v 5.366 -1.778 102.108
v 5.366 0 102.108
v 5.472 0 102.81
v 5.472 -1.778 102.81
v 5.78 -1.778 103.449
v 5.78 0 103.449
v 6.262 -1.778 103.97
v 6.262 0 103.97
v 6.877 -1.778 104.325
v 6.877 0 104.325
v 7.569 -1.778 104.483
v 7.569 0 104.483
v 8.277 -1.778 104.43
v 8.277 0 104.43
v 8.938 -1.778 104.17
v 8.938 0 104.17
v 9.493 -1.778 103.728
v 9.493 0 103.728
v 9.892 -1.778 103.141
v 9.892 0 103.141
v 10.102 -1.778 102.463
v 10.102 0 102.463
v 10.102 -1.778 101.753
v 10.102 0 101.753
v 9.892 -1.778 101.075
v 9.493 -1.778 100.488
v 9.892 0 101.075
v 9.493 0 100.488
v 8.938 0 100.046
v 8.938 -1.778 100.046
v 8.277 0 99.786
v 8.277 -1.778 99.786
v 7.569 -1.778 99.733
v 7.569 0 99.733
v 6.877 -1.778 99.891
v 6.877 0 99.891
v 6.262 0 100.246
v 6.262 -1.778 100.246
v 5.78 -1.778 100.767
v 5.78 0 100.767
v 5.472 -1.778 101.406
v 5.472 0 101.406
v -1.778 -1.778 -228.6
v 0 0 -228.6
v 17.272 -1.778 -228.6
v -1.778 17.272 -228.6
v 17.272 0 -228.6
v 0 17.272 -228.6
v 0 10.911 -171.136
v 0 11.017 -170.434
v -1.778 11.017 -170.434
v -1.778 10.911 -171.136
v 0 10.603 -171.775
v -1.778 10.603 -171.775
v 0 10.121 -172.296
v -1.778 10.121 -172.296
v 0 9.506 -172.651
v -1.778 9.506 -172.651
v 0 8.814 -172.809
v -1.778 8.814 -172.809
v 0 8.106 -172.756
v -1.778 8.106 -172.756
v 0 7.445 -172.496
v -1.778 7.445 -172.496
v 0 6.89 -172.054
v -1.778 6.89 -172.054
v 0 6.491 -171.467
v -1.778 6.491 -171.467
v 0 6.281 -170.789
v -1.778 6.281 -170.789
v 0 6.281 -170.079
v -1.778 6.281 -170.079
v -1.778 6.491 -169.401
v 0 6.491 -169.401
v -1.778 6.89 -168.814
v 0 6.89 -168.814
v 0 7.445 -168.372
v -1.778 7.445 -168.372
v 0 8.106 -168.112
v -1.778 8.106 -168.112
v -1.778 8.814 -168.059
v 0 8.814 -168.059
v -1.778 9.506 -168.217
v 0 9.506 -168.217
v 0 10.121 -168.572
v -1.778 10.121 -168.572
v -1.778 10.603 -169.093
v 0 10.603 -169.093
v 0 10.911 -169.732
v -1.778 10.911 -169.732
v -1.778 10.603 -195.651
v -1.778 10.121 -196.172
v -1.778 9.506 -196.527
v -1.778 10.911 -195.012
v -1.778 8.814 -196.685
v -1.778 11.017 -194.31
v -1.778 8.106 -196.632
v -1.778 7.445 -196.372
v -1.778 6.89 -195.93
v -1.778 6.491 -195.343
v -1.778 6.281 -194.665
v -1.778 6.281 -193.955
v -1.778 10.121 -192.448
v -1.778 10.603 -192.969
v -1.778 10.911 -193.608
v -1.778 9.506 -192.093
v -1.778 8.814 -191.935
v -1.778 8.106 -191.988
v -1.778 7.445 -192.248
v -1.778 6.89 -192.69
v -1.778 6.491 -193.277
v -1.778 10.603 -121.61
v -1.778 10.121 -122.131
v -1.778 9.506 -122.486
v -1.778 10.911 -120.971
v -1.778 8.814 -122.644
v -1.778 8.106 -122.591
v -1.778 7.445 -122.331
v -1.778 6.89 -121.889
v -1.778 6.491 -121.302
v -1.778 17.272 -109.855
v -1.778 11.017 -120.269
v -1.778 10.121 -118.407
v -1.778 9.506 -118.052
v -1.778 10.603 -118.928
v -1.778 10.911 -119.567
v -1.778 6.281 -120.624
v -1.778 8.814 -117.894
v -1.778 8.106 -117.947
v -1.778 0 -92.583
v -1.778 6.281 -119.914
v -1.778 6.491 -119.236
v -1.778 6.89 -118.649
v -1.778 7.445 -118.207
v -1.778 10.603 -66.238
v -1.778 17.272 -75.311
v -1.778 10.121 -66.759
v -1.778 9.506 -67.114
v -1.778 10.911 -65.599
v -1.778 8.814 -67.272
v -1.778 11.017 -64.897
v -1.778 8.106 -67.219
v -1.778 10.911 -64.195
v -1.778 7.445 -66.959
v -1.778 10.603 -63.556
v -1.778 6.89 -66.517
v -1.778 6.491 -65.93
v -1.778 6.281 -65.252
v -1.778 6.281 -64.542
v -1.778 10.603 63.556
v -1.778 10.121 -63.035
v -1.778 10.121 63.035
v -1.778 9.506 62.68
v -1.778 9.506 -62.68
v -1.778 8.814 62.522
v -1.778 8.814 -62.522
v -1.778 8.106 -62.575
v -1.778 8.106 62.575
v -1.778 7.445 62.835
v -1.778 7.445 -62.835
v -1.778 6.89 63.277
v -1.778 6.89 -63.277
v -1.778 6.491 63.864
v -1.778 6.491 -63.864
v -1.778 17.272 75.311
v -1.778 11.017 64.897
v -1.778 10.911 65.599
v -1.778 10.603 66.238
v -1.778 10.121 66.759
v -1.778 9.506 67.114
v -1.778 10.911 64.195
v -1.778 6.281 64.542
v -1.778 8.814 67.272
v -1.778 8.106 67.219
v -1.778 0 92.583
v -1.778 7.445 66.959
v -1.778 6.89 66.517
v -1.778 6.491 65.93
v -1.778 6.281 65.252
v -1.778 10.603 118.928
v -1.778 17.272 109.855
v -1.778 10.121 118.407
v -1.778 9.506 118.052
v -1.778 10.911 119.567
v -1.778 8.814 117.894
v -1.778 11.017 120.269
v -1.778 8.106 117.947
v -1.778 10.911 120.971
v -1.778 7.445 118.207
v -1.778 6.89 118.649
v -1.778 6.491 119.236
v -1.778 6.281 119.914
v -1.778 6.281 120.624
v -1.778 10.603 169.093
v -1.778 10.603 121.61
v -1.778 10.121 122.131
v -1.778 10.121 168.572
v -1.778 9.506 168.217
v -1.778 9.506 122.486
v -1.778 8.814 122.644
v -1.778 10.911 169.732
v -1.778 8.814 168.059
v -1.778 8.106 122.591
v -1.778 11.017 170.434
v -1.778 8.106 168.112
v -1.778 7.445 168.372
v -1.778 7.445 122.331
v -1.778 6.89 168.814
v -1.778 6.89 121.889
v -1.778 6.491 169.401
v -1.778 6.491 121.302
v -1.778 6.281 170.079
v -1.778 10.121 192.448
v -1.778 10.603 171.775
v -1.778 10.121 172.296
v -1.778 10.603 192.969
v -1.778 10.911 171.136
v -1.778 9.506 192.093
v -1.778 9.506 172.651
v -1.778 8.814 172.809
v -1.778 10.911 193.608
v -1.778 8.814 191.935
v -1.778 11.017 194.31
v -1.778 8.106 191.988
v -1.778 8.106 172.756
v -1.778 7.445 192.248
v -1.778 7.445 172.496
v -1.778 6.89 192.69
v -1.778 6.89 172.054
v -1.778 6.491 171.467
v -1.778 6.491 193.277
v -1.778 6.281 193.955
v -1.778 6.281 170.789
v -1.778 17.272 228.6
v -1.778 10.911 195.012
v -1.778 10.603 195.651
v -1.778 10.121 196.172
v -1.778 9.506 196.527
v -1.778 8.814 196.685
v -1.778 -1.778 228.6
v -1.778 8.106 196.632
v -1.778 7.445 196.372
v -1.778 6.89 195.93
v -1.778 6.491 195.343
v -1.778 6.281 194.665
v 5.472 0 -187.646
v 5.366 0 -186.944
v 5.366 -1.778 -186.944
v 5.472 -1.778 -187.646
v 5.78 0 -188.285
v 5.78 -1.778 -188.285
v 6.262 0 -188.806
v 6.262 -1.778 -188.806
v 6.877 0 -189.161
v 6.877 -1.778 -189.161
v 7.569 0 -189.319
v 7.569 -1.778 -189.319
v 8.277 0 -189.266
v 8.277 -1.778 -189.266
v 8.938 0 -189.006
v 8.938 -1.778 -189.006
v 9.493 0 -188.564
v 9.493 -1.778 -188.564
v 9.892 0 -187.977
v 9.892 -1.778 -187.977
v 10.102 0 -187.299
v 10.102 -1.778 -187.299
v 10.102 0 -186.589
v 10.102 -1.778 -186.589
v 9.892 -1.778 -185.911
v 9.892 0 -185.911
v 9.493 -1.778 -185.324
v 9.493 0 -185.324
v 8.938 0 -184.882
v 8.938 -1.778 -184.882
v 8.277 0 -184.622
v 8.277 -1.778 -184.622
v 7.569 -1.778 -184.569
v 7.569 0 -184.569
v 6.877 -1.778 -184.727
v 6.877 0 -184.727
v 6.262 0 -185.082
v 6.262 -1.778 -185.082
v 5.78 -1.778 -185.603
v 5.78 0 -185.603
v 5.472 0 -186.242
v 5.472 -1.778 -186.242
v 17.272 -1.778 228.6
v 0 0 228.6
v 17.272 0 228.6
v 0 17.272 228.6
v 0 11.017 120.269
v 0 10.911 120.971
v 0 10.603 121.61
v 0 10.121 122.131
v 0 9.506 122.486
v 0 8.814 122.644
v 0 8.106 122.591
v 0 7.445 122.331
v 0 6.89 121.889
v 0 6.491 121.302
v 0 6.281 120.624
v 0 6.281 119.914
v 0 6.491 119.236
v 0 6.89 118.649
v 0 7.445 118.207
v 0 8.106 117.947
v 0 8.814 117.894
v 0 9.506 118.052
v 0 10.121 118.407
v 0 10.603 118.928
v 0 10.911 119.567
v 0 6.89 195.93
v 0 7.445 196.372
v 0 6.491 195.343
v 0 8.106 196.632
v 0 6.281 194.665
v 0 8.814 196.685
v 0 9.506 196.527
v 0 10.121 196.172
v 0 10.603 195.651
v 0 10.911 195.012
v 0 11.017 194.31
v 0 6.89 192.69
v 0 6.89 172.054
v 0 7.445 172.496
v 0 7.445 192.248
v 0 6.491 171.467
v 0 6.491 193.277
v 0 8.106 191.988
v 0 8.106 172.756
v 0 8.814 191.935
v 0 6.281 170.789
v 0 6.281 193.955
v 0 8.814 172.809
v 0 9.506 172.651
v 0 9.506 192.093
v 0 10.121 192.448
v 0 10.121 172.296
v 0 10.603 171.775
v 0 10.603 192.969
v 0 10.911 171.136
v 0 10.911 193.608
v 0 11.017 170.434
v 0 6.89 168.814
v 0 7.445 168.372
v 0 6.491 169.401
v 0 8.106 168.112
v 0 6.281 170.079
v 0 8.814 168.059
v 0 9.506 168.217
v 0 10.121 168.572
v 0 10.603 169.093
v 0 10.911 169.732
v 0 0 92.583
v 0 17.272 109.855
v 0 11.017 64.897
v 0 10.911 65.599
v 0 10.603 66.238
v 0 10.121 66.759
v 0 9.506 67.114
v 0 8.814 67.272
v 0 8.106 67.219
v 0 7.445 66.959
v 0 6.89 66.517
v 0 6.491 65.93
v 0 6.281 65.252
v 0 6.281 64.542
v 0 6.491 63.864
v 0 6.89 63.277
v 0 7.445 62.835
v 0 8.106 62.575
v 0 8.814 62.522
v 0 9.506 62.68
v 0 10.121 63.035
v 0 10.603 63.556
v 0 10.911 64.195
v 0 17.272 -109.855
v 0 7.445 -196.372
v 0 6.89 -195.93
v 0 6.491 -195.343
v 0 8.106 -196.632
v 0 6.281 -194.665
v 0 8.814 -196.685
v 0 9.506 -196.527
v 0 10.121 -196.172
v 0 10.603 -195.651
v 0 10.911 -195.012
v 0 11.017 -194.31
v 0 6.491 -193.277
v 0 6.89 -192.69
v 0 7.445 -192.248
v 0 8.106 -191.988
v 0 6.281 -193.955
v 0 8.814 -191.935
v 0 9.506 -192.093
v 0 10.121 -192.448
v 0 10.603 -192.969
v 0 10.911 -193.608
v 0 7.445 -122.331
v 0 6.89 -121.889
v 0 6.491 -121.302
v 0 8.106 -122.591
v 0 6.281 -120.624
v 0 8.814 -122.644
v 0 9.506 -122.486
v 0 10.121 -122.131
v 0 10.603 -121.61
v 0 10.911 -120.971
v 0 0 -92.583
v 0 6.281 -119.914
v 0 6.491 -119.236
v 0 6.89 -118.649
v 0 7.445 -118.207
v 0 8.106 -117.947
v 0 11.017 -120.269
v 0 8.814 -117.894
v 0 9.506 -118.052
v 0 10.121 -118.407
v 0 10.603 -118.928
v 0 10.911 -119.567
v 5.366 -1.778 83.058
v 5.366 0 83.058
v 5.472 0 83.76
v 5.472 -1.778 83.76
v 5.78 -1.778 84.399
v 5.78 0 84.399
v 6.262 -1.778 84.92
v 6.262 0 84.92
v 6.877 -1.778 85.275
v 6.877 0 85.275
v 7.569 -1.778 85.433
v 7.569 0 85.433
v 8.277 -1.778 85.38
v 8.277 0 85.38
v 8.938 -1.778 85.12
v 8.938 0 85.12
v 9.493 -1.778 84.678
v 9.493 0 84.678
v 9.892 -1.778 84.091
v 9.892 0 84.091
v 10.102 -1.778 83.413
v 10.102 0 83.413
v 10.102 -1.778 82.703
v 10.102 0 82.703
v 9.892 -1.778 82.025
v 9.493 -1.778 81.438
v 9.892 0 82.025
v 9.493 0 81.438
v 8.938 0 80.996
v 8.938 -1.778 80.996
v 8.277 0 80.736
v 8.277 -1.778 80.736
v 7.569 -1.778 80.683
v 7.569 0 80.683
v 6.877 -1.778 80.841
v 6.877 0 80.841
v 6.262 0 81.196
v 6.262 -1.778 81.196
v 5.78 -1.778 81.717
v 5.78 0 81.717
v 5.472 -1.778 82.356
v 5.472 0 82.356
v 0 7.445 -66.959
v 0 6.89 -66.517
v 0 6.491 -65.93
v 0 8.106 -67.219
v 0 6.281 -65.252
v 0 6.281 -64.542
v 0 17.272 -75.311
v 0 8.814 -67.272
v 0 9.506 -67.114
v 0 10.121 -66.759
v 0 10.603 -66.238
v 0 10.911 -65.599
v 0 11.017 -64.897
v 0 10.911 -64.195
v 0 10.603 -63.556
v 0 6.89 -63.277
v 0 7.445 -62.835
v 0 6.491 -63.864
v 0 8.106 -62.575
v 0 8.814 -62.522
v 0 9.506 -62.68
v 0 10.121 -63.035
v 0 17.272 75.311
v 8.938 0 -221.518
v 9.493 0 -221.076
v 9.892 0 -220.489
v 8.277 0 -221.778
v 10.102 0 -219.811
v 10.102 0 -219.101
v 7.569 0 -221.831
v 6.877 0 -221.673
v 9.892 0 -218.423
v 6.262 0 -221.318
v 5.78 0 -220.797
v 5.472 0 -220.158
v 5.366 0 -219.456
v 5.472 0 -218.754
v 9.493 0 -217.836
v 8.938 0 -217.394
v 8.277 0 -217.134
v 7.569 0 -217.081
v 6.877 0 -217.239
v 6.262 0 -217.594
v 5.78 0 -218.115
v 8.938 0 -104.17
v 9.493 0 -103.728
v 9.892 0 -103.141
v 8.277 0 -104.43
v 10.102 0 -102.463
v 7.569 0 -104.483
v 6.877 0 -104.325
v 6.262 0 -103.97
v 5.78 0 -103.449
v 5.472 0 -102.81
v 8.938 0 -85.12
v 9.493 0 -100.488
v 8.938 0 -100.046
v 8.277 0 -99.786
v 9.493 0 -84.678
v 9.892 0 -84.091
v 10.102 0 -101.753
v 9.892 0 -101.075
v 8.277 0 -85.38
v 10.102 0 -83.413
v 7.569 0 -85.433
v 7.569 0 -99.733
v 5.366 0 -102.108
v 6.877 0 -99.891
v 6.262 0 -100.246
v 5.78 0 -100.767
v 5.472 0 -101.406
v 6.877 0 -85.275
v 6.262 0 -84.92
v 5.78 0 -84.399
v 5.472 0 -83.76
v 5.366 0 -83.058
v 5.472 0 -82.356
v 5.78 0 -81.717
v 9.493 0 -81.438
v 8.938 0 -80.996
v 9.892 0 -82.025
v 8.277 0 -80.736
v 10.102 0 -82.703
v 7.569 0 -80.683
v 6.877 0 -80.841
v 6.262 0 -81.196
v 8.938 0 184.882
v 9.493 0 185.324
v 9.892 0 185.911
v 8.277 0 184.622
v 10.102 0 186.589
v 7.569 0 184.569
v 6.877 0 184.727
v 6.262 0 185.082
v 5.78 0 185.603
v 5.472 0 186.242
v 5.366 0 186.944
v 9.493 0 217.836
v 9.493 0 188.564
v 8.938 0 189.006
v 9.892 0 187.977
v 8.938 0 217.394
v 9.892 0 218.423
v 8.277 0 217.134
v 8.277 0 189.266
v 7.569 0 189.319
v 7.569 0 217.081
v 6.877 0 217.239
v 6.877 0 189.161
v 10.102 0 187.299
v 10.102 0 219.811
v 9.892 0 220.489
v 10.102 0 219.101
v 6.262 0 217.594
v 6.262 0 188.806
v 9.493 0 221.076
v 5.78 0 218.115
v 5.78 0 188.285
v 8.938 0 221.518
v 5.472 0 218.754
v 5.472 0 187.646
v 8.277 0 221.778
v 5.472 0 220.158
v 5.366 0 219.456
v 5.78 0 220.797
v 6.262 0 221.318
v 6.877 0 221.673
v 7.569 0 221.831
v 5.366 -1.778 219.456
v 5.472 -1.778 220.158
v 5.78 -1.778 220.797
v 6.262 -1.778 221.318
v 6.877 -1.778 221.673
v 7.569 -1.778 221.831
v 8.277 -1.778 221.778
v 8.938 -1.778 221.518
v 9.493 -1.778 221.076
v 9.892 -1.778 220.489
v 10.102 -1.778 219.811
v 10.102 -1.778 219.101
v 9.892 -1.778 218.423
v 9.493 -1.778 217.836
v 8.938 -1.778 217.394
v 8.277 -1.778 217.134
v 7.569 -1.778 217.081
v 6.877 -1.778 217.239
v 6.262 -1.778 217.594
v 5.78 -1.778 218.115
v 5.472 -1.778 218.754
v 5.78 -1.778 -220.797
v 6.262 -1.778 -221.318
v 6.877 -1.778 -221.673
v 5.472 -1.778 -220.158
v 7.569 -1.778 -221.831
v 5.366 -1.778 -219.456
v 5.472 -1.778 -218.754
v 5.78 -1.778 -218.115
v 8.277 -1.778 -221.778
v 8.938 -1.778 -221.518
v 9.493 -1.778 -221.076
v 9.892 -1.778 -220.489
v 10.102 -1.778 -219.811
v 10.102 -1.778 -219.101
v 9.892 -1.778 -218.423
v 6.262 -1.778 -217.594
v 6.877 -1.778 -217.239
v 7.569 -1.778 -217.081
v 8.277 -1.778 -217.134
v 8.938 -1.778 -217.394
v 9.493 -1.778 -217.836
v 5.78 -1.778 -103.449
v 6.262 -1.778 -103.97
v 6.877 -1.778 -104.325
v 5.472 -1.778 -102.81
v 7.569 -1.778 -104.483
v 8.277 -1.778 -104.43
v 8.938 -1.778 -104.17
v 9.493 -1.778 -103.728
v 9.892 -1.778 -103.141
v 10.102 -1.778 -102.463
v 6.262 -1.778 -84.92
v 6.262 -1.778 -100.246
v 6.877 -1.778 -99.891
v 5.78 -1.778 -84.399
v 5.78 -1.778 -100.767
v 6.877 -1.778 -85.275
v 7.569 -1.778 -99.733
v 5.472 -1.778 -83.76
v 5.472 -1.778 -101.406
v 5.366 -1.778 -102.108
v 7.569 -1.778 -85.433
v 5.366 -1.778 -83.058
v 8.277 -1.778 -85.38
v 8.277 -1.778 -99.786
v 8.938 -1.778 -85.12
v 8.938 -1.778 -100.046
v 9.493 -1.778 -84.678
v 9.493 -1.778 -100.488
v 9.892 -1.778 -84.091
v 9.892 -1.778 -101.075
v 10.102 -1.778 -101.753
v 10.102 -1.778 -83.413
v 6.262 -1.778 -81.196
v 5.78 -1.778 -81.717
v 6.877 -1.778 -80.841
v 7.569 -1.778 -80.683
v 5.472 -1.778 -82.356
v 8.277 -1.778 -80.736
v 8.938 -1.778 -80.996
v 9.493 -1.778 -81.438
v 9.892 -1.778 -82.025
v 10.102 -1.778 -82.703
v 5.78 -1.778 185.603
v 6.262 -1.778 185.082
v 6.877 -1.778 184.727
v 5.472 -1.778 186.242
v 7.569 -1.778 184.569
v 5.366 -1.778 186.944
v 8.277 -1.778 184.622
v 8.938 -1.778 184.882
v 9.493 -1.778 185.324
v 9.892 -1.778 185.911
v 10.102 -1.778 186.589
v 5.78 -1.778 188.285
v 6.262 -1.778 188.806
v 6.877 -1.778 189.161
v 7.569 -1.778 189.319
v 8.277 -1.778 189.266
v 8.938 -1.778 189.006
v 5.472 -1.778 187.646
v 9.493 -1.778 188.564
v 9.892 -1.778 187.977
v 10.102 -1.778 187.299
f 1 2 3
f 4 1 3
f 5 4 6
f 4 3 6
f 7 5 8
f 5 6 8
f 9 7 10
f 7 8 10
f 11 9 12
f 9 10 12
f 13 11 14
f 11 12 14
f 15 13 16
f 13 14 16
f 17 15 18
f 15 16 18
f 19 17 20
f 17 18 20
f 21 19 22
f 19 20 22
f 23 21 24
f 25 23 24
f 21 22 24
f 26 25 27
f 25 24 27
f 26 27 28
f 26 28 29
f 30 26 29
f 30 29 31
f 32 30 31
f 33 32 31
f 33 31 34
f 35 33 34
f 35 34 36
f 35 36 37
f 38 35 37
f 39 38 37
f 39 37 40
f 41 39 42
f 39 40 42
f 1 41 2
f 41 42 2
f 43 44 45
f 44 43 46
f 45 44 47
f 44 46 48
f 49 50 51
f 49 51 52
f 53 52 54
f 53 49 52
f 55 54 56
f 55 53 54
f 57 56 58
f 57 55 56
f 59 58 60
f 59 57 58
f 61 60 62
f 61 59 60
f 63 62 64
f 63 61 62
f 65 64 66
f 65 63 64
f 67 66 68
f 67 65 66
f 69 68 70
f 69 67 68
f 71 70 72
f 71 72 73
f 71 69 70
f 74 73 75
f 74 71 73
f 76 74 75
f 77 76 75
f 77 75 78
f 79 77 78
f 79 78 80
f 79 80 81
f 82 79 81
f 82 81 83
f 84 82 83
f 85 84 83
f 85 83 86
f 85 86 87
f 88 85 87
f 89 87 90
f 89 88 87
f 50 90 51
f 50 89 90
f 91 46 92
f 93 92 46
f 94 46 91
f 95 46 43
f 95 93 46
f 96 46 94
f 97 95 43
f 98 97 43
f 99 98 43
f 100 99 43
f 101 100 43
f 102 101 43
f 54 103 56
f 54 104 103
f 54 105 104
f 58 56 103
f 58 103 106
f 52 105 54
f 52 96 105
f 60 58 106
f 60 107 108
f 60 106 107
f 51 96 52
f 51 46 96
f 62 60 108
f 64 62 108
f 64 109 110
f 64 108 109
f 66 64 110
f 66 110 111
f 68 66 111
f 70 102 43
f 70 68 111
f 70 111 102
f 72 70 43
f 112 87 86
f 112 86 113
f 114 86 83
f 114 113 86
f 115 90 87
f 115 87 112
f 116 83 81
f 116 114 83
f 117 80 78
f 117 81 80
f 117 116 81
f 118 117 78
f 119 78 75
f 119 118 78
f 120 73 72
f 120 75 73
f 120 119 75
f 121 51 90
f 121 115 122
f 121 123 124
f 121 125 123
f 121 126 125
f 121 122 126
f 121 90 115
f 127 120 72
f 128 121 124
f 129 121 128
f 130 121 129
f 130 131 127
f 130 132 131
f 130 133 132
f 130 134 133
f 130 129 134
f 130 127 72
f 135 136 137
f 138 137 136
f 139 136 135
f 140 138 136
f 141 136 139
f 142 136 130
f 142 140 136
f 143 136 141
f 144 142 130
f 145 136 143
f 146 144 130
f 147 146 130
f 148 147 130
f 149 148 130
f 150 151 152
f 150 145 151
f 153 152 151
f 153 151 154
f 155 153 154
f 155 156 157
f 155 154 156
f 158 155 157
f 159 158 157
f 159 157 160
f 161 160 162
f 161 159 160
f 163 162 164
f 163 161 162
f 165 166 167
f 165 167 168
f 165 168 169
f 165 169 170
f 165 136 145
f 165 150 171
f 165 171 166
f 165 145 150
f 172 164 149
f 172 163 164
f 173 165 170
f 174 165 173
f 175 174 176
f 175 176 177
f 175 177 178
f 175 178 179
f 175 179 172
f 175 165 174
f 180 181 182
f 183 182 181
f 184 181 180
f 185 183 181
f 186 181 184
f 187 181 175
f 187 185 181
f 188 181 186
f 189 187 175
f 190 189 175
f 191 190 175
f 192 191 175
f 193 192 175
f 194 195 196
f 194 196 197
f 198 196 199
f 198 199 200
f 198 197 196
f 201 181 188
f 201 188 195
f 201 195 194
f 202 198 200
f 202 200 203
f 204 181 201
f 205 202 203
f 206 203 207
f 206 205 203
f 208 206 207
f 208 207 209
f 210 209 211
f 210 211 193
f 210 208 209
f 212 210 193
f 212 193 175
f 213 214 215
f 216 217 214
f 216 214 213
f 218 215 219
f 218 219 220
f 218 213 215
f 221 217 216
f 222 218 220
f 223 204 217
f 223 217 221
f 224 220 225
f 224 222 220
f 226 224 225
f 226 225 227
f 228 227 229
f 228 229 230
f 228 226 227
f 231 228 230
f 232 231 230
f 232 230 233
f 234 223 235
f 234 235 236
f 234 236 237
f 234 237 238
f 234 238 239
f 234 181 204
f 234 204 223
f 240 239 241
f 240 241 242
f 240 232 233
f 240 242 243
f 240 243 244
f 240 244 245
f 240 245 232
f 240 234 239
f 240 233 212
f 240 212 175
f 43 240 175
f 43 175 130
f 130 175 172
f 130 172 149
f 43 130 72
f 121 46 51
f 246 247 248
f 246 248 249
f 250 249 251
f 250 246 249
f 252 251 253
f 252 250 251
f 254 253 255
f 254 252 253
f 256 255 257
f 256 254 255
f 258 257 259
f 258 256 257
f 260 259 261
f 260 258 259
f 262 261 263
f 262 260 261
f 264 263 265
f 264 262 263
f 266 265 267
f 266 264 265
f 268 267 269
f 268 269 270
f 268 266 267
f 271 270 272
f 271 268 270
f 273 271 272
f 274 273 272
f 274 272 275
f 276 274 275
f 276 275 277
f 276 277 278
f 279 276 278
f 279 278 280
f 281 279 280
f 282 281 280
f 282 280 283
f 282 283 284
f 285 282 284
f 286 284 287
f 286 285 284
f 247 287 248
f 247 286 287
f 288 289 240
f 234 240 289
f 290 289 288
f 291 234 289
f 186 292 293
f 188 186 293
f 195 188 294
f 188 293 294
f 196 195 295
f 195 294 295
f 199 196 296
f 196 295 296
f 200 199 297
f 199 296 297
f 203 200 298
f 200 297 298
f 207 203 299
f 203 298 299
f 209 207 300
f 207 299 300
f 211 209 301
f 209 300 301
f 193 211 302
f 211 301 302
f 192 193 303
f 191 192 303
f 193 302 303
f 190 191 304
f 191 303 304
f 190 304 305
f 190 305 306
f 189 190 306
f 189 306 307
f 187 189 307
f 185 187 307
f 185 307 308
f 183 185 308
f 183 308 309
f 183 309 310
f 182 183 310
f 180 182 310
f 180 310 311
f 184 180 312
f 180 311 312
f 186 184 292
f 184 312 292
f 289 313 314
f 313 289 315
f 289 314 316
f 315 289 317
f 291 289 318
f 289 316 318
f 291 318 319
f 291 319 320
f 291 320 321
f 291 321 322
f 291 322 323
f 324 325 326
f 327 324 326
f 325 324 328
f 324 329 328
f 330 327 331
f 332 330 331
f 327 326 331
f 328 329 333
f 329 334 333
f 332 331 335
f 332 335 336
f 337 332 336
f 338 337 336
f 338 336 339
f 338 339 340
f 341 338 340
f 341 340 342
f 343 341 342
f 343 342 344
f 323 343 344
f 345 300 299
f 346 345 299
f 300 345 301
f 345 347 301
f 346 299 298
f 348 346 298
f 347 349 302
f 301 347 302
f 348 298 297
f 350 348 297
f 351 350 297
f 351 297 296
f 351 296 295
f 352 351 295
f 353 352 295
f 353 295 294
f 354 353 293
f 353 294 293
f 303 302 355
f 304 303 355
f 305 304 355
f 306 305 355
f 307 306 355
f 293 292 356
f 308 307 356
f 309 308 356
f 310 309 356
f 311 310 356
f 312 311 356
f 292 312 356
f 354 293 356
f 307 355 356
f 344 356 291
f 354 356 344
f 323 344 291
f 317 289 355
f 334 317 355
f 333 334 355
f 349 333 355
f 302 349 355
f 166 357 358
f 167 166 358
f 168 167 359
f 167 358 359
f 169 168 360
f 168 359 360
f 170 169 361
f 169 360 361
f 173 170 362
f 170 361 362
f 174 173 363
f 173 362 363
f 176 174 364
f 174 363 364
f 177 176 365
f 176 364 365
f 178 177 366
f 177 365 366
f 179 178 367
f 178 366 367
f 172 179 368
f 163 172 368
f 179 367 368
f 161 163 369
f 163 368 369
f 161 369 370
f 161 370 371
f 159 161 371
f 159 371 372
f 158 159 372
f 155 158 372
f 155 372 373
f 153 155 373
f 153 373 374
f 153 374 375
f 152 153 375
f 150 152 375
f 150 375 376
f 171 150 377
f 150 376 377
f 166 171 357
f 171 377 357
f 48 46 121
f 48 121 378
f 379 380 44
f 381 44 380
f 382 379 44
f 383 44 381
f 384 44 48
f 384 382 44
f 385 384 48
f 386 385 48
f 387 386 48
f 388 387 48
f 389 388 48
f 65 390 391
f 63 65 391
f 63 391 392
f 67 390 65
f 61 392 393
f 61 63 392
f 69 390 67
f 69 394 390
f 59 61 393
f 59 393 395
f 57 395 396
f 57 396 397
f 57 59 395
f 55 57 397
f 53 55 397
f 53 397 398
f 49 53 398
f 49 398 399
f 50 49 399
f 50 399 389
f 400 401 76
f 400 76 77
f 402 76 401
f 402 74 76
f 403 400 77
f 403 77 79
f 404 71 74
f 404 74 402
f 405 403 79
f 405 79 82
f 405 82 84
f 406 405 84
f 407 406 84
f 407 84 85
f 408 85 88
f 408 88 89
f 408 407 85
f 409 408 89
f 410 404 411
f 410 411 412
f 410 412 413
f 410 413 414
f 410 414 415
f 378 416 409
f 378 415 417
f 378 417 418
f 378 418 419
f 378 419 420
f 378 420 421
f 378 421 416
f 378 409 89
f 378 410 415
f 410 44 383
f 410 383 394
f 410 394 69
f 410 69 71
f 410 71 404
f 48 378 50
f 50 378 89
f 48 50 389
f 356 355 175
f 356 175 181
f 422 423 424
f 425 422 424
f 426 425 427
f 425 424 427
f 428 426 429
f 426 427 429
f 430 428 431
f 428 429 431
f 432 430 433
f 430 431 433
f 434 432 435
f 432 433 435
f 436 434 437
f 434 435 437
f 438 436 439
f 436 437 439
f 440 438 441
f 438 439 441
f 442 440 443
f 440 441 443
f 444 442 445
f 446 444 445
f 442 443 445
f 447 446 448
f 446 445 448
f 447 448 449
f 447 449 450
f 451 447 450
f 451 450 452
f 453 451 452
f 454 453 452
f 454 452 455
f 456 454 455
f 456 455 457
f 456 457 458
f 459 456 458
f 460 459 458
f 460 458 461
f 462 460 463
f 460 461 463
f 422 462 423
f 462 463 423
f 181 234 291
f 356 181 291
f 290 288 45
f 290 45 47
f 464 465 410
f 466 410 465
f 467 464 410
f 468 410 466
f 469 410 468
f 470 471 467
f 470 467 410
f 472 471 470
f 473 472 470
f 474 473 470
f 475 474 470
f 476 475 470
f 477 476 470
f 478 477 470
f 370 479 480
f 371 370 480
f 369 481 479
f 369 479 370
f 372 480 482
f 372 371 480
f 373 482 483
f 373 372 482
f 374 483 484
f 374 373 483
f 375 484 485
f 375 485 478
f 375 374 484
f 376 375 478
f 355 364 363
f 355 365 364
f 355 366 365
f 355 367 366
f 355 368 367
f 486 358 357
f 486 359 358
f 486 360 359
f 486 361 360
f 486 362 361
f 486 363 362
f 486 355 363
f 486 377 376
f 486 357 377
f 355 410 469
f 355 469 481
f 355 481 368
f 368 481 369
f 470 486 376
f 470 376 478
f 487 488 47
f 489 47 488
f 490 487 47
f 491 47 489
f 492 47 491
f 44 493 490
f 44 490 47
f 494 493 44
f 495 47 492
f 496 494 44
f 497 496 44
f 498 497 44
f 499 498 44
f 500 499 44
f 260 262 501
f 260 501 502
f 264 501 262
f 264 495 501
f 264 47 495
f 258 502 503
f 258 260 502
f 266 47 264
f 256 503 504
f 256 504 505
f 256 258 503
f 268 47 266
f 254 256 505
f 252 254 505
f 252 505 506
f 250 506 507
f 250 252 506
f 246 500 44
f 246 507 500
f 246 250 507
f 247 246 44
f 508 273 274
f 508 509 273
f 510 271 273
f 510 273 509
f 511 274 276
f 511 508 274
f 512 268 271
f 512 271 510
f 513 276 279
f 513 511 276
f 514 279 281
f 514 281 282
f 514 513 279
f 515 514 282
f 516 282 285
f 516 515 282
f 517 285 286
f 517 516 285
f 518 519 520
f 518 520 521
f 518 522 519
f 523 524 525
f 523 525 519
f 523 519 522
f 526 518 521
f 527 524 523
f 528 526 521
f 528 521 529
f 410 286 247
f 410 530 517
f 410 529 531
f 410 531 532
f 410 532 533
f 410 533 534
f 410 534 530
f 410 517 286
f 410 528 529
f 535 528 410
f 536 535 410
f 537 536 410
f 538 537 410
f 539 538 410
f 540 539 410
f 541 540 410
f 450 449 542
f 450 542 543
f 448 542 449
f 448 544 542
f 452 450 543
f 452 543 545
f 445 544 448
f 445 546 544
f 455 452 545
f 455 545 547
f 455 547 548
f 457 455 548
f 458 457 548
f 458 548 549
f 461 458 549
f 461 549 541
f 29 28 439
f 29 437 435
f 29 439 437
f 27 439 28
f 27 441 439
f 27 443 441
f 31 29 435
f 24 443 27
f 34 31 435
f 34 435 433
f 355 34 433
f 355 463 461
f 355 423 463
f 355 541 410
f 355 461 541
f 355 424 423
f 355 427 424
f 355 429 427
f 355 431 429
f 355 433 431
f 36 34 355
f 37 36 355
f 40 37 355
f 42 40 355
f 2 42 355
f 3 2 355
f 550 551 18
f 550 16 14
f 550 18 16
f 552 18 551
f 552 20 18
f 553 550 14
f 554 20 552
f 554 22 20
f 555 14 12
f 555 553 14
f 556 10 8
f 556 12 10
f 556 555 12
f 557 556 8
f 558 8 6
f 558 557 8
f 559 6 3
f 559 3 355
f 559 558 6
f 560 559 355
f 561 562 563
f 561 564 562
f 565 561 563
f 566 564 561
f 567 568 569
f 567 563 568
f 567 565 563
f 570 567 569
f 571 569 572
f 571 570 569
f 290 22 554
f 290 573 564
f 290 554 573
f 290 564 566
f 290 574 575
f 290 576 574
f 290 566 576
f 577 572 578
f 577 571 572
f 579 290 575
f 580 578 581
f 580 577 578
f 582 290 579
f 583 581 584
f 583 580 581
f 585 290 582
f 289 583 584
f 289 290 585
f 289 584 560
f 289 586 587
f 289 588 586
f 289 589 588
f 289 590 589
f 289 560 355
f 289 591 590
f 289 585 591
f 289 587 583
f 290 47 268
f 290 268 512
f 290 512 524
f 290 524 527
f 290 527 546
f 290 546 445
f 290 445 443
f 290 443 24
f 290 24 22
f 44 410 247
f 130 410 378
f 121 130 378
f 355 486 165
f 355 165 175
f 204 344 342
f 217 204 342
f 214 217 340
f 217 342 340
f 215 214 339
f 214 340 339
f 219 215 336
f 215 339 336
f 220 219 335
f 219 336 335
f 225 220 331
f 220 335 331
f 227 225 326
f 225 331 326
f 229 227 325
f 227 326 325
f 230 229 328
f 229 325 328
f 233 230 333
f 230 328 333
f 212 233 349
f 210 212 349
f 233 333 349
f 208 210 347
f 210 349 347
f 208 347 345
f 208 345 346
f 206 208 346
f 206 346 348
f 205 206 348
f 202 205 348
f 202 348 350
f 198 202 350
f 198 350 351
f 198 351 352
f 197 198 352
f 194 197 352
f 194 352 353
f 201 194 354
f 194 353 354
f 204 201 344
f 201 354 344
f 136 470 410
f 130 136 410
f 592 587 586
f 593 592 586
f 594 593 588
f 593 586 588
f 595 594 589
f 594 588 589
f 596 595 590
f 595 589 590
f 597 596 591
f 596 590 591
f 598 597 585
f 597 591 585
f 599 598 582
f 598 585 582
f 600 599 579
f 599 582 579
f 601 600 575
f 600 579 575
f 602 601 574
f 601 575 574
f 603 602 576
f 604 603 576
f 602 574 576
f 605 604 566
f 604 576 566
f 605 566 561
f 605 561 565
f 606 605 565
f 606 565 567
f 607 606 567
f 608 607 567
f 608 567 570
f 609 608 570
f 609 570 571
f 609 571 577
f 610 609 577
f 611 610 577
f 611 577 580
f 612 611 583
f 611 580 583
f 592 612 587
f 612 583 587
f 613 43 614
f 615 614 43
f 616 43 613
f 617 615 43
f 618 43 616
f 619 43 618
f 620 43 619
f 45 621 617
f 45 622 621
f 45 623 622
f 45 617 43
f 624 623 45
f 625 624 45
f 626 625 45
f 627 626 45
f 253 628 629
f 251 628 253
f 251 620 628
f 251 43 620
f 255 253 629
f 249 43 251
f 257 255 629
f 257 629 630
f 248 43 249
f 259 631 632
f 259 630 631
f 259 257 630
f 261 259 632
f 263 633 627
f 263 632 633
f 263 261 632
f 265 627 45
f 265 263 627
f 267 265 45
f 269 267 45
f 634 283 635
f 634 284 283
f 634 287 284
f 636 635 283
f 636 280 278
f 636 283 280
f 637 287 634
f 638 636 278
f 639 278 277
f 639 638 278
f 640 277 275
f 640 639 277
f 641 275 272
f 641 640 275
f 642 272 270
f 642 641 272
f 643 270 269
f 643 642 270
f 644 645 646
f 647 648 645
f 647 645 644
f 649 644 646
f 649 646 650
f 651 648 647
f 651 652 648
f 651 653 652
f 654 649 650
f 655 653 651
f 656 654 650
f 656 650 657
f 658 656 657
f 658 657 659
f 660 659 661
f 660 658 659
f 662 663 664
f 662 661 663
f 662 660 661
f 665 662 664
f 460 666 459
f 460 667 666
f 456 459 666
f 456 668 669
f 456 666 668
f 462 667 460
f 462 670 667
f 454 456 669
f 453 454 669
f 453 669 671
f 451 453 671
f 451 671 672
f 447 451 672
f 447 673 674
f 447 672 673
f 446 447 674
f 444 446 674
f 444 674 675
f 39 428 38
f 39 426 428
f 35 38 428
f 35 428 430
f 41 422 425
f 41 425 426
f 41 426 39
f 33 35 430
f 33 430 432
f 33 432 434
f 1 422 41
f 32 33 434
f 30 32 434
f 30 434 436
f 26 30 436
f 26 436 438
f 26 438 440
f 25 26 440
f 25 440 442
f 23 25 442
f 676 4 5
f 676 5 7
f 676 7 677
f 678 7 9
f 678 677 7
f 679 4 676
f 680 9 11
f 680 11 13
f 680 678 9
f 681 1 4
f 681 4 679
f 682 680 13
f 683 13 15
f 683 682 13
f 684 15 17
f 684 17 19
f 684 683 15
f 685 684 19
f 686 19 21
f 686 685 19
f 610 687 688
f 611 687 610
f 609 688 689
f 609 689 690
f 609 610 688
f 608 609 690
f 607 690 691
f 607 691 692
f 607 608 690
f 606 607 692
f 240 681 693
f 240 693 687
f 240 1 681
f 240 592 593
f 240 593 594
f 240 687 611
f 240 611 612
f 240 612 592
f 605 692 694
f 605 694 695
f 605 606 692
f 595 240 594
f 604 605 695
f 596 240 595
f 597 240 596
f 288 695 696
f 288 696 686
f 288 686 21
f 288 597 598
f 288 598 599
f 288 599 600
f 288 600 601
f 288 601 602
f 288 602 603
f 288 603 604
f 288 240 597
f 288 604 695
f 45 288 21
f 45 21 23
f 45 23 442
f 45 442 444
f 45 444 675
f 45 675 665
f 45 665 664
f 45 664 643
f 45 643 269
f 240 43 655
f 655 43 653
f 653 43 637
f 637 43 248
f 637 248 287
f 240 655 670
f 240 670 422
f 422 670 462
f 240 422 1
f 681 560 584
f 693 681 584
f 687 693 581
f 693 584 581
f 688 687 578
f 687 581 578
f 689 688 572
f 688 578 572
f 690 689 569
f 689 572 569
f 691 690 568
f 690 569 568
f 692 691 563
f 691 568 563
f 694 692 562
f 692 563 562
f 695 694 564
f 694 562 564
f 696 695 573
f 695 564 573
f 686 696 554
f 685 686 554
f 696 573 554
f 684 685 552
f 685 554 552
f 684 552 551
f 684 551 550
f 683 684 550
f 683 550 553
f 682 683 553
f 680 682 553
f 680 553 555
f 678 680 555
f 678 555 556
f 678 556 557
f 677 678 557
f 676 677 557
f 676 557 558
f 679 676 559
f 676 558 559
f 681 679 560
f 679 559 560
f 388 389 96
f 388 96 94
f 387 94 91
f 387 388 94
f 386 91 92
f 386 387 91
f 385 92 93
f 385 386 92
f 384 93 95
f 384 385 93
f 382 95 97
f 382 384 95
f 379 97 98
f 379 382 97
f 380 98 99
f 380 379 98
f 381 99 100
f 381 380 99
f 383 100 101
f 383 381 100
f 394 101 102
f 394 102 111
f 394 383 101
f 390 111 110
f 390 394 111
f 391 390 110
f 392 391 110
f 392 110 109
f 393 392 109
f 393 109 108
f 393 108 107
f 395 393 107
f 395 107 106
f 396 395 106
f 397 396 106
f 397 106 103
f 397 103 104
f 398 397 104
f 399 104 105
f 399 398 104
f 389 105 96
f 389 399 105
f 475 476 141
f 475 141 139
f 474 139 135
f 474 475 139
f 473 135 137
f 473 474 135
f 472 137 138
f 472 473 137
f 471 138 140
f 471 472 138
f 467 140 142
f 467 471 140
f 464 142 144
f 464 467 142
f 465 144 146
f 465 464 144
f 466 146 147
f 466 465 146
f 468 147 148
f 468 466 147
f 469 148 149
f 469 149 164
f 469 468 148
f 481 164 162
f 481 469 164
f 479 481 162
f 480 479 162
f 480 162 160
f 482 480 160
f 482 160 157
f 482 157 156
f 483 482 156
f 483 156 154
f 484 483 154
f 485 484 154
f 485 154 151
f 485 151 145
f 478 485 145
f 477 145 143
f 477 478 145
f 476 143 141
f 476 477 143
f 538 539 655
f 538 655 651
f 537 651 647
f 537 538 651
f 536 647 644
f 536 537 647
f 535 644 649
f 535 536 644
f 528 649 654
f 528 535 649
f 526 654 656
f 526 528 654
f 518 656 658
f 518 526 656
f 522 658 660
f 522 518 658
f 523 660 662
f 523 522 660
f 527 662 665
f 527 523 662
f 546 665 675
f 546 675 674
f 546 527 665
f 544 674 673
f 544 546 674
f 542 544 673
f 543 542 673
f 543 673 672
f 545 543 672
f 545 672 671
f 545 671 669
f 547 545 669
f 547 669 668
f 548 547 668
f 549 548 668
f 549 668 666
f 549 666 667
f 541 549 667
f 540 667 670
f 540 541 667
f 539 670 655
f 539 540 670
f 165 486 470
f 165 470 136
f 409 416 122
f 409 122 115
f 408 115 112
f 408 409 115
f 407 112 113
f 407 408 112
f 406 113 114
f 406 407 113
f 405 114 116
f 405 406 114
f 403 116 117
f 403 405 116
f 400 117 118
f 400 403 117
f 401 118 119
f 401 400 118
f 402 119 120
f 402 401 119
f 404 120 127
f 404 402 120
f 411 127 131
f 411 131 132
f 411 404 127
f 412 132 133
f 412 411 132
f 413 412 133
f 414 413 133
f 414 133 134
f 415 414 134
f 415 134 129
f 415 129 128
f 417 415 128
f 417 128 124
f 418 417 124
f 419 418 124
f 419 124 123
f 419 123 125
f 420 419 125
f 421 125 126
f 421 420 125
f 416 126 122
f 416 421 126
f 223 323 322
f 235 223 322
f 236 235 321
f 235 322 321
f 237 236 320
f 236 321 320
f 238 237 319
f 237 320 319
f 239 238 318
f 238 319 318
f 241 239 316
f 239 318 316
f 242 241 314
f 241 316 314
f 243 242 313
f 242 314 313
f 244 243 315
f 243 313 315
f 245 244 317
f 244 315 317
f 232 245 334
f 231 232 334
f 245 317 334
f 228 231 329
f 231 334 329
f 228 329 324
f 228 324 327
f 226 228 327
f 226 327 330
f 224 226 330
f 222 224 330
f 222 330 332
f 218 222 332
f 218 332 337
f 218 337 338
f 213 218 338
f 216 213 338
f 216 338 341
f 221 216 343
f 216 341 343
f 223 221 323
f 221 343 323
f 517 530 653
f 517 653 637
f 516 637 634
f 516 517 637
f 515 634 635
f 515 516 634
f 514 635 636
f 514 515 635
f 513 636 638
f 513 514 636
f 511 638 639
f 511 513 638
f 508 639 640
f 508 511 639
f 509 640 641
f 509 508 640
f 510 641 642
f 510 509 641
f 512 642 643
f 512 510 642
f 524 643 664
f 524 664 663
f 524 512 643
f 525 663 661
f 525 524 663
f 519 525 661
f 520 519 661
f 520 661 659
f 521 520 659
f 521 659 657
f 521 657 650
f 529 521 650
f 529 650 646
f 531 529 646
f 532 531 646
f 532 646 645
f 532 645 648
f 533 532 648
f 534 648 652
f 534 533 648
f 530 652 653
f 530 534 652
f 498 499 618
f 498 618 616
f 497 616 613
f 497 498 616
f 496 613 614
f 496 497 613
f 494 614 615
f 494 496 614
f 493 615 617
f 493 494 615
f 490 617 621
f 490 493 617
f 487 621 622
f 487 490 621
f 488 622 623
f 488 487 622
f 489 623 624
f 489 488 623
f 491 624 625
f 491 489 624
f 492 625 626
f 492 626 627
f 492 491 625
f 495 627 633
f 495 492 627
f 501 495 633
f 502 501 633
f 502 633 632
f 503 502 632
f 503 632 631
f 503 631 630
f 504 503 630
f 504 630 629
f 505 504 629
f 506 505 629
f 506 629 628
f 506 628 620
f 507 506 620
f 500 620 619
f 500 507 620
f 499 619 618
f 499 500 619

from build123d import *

# Parameters (mm, degrees)
BOSS_EXTRUDE1_DEPTH = 208.28
SKETCH2_R           = 2.38125
CUT_EXTRUDE1_DEPTH  = 1.778
SKETCH3_W           = 1.778
SKETCH3_H           = 17.272
BOSS_EXTRUDE2_DEPTH = 20.32
SKETCH4_R           = 2.38125
CUT_EXTRUDE2_DEPTH  = 1.778


with BuildPart() as part:
    # Sketch1 → Boss-Extrude1 (new body)
    with BuildSketch(Plane.XY):
        Polygon((0, 0), (0, 17.272), (-1.778, 17.272), (-1.778, -1.778), (17.272, -1.778), (17.272, 0), align=None)
    boss_extrude1 = extrude(amount=BOSS_EXTRUDE1_DEPTH)

    # Sketch2 → Cut-Extrude1 (cut)
    with BuildSketch(Plane(origin=(0, 0, 0), x_dir=(0, 0, -1), z_dir=(1, 0, 0))):
        with Locations(Location((-194.31, 8.636, 0), (0, 0, 90))):
            Circle(SKETCH2_R)
        with Locations(Location((-170.434, 8.636, 0), (0, 0, 90))):
            Circle(SKETCH2_R)
        with Locations(Location((-120.269, 8.636, 0), (0, 0, 90))):
            Circle(SKETCH2_R)
        with Locations(Location((-64.897, 8.636, 0), (0, 0, 90))):
            Circle(SKETCH2_R)
        Polygon((-92.583, 0), (-109.855, 17.272), (-75.311, 17.272), align=None)
    cut_extrude1 = extrude(amount=-CUT_EXTRUDE1_DEPTH, mode=Mode.SUBTRACT)

    # Sketch3 → Boss-Extrude2 (add)
    with BuildSketch(Plane.XY.offset(208.28)):
        Polygon((-1.778, 0), (-1.778, -1.778), (17.272, -1.778), (17.272, 0), (0, 0), align=None)
        with Locations((-0.889, 8.636)):
            Rectangle(SKETCH3_W, SKETCH3_H)
    boss_extrude2 = extrude(amount=BOSS_EXTRUDE2_DEPTH)

    # Sketch4 → Cut-Extrude2 (cut)
    with BuildSketch(Plane(origin=(0, 0, 0), x_dir=(1, 0, 0), z_dir=(0, 1, 0))):
        with Locations(Location((7.747, -219.456, 0), (0, 0, 180))):
            Circle(SKETCH4_R)
        with Locations(Location((7.747, -83.058, 0), (0, 0, 180))):
            Circle(SKETCH4_R)
        with Locations(Location((7.747, -102.108, 0), (0, 0, 180))):
            Circle(SKETCH4_R)
        with Locations(Location((7.747, -186.944, 0), (0, 0, 180))):
            Circle(SKETCH4_R)
    cut_extrude2 = extrude(amount=-CUT_EXTRUDE2_DEPTH, mode=Mode.SUBTRACT)

    # Mirror3: Boss-Extrude1, Cut-Extrude1, Boss-Extrude2, Cut-Extrude2 across plane
    add(boss_extrude1.mirror(Plane(origin=(0, 0, 0), x_dir=(1, 0, 0), z_dir=(0, 0, -1))))
    add(cut_extrude1.mirror(Plane(origin=(0, 0, 0), x_dir=(1, 0, 0), z_dir=(0, 0, -1))), mode=Mode.SUBTRACT)
    add(boss_extrude2.mirror(Plane(origin=(0, 0, 0), x_dir=(1, 0, 0), z_dir=(0, 0, -1))))
    add(cut_extrude2.mirror(Plane(origin=(0, 0, 0), x_dir=(1, 0, 0), z_dir=(0, 0, -1))), mode=Mode.SUBTRACT)


solid = part.part
